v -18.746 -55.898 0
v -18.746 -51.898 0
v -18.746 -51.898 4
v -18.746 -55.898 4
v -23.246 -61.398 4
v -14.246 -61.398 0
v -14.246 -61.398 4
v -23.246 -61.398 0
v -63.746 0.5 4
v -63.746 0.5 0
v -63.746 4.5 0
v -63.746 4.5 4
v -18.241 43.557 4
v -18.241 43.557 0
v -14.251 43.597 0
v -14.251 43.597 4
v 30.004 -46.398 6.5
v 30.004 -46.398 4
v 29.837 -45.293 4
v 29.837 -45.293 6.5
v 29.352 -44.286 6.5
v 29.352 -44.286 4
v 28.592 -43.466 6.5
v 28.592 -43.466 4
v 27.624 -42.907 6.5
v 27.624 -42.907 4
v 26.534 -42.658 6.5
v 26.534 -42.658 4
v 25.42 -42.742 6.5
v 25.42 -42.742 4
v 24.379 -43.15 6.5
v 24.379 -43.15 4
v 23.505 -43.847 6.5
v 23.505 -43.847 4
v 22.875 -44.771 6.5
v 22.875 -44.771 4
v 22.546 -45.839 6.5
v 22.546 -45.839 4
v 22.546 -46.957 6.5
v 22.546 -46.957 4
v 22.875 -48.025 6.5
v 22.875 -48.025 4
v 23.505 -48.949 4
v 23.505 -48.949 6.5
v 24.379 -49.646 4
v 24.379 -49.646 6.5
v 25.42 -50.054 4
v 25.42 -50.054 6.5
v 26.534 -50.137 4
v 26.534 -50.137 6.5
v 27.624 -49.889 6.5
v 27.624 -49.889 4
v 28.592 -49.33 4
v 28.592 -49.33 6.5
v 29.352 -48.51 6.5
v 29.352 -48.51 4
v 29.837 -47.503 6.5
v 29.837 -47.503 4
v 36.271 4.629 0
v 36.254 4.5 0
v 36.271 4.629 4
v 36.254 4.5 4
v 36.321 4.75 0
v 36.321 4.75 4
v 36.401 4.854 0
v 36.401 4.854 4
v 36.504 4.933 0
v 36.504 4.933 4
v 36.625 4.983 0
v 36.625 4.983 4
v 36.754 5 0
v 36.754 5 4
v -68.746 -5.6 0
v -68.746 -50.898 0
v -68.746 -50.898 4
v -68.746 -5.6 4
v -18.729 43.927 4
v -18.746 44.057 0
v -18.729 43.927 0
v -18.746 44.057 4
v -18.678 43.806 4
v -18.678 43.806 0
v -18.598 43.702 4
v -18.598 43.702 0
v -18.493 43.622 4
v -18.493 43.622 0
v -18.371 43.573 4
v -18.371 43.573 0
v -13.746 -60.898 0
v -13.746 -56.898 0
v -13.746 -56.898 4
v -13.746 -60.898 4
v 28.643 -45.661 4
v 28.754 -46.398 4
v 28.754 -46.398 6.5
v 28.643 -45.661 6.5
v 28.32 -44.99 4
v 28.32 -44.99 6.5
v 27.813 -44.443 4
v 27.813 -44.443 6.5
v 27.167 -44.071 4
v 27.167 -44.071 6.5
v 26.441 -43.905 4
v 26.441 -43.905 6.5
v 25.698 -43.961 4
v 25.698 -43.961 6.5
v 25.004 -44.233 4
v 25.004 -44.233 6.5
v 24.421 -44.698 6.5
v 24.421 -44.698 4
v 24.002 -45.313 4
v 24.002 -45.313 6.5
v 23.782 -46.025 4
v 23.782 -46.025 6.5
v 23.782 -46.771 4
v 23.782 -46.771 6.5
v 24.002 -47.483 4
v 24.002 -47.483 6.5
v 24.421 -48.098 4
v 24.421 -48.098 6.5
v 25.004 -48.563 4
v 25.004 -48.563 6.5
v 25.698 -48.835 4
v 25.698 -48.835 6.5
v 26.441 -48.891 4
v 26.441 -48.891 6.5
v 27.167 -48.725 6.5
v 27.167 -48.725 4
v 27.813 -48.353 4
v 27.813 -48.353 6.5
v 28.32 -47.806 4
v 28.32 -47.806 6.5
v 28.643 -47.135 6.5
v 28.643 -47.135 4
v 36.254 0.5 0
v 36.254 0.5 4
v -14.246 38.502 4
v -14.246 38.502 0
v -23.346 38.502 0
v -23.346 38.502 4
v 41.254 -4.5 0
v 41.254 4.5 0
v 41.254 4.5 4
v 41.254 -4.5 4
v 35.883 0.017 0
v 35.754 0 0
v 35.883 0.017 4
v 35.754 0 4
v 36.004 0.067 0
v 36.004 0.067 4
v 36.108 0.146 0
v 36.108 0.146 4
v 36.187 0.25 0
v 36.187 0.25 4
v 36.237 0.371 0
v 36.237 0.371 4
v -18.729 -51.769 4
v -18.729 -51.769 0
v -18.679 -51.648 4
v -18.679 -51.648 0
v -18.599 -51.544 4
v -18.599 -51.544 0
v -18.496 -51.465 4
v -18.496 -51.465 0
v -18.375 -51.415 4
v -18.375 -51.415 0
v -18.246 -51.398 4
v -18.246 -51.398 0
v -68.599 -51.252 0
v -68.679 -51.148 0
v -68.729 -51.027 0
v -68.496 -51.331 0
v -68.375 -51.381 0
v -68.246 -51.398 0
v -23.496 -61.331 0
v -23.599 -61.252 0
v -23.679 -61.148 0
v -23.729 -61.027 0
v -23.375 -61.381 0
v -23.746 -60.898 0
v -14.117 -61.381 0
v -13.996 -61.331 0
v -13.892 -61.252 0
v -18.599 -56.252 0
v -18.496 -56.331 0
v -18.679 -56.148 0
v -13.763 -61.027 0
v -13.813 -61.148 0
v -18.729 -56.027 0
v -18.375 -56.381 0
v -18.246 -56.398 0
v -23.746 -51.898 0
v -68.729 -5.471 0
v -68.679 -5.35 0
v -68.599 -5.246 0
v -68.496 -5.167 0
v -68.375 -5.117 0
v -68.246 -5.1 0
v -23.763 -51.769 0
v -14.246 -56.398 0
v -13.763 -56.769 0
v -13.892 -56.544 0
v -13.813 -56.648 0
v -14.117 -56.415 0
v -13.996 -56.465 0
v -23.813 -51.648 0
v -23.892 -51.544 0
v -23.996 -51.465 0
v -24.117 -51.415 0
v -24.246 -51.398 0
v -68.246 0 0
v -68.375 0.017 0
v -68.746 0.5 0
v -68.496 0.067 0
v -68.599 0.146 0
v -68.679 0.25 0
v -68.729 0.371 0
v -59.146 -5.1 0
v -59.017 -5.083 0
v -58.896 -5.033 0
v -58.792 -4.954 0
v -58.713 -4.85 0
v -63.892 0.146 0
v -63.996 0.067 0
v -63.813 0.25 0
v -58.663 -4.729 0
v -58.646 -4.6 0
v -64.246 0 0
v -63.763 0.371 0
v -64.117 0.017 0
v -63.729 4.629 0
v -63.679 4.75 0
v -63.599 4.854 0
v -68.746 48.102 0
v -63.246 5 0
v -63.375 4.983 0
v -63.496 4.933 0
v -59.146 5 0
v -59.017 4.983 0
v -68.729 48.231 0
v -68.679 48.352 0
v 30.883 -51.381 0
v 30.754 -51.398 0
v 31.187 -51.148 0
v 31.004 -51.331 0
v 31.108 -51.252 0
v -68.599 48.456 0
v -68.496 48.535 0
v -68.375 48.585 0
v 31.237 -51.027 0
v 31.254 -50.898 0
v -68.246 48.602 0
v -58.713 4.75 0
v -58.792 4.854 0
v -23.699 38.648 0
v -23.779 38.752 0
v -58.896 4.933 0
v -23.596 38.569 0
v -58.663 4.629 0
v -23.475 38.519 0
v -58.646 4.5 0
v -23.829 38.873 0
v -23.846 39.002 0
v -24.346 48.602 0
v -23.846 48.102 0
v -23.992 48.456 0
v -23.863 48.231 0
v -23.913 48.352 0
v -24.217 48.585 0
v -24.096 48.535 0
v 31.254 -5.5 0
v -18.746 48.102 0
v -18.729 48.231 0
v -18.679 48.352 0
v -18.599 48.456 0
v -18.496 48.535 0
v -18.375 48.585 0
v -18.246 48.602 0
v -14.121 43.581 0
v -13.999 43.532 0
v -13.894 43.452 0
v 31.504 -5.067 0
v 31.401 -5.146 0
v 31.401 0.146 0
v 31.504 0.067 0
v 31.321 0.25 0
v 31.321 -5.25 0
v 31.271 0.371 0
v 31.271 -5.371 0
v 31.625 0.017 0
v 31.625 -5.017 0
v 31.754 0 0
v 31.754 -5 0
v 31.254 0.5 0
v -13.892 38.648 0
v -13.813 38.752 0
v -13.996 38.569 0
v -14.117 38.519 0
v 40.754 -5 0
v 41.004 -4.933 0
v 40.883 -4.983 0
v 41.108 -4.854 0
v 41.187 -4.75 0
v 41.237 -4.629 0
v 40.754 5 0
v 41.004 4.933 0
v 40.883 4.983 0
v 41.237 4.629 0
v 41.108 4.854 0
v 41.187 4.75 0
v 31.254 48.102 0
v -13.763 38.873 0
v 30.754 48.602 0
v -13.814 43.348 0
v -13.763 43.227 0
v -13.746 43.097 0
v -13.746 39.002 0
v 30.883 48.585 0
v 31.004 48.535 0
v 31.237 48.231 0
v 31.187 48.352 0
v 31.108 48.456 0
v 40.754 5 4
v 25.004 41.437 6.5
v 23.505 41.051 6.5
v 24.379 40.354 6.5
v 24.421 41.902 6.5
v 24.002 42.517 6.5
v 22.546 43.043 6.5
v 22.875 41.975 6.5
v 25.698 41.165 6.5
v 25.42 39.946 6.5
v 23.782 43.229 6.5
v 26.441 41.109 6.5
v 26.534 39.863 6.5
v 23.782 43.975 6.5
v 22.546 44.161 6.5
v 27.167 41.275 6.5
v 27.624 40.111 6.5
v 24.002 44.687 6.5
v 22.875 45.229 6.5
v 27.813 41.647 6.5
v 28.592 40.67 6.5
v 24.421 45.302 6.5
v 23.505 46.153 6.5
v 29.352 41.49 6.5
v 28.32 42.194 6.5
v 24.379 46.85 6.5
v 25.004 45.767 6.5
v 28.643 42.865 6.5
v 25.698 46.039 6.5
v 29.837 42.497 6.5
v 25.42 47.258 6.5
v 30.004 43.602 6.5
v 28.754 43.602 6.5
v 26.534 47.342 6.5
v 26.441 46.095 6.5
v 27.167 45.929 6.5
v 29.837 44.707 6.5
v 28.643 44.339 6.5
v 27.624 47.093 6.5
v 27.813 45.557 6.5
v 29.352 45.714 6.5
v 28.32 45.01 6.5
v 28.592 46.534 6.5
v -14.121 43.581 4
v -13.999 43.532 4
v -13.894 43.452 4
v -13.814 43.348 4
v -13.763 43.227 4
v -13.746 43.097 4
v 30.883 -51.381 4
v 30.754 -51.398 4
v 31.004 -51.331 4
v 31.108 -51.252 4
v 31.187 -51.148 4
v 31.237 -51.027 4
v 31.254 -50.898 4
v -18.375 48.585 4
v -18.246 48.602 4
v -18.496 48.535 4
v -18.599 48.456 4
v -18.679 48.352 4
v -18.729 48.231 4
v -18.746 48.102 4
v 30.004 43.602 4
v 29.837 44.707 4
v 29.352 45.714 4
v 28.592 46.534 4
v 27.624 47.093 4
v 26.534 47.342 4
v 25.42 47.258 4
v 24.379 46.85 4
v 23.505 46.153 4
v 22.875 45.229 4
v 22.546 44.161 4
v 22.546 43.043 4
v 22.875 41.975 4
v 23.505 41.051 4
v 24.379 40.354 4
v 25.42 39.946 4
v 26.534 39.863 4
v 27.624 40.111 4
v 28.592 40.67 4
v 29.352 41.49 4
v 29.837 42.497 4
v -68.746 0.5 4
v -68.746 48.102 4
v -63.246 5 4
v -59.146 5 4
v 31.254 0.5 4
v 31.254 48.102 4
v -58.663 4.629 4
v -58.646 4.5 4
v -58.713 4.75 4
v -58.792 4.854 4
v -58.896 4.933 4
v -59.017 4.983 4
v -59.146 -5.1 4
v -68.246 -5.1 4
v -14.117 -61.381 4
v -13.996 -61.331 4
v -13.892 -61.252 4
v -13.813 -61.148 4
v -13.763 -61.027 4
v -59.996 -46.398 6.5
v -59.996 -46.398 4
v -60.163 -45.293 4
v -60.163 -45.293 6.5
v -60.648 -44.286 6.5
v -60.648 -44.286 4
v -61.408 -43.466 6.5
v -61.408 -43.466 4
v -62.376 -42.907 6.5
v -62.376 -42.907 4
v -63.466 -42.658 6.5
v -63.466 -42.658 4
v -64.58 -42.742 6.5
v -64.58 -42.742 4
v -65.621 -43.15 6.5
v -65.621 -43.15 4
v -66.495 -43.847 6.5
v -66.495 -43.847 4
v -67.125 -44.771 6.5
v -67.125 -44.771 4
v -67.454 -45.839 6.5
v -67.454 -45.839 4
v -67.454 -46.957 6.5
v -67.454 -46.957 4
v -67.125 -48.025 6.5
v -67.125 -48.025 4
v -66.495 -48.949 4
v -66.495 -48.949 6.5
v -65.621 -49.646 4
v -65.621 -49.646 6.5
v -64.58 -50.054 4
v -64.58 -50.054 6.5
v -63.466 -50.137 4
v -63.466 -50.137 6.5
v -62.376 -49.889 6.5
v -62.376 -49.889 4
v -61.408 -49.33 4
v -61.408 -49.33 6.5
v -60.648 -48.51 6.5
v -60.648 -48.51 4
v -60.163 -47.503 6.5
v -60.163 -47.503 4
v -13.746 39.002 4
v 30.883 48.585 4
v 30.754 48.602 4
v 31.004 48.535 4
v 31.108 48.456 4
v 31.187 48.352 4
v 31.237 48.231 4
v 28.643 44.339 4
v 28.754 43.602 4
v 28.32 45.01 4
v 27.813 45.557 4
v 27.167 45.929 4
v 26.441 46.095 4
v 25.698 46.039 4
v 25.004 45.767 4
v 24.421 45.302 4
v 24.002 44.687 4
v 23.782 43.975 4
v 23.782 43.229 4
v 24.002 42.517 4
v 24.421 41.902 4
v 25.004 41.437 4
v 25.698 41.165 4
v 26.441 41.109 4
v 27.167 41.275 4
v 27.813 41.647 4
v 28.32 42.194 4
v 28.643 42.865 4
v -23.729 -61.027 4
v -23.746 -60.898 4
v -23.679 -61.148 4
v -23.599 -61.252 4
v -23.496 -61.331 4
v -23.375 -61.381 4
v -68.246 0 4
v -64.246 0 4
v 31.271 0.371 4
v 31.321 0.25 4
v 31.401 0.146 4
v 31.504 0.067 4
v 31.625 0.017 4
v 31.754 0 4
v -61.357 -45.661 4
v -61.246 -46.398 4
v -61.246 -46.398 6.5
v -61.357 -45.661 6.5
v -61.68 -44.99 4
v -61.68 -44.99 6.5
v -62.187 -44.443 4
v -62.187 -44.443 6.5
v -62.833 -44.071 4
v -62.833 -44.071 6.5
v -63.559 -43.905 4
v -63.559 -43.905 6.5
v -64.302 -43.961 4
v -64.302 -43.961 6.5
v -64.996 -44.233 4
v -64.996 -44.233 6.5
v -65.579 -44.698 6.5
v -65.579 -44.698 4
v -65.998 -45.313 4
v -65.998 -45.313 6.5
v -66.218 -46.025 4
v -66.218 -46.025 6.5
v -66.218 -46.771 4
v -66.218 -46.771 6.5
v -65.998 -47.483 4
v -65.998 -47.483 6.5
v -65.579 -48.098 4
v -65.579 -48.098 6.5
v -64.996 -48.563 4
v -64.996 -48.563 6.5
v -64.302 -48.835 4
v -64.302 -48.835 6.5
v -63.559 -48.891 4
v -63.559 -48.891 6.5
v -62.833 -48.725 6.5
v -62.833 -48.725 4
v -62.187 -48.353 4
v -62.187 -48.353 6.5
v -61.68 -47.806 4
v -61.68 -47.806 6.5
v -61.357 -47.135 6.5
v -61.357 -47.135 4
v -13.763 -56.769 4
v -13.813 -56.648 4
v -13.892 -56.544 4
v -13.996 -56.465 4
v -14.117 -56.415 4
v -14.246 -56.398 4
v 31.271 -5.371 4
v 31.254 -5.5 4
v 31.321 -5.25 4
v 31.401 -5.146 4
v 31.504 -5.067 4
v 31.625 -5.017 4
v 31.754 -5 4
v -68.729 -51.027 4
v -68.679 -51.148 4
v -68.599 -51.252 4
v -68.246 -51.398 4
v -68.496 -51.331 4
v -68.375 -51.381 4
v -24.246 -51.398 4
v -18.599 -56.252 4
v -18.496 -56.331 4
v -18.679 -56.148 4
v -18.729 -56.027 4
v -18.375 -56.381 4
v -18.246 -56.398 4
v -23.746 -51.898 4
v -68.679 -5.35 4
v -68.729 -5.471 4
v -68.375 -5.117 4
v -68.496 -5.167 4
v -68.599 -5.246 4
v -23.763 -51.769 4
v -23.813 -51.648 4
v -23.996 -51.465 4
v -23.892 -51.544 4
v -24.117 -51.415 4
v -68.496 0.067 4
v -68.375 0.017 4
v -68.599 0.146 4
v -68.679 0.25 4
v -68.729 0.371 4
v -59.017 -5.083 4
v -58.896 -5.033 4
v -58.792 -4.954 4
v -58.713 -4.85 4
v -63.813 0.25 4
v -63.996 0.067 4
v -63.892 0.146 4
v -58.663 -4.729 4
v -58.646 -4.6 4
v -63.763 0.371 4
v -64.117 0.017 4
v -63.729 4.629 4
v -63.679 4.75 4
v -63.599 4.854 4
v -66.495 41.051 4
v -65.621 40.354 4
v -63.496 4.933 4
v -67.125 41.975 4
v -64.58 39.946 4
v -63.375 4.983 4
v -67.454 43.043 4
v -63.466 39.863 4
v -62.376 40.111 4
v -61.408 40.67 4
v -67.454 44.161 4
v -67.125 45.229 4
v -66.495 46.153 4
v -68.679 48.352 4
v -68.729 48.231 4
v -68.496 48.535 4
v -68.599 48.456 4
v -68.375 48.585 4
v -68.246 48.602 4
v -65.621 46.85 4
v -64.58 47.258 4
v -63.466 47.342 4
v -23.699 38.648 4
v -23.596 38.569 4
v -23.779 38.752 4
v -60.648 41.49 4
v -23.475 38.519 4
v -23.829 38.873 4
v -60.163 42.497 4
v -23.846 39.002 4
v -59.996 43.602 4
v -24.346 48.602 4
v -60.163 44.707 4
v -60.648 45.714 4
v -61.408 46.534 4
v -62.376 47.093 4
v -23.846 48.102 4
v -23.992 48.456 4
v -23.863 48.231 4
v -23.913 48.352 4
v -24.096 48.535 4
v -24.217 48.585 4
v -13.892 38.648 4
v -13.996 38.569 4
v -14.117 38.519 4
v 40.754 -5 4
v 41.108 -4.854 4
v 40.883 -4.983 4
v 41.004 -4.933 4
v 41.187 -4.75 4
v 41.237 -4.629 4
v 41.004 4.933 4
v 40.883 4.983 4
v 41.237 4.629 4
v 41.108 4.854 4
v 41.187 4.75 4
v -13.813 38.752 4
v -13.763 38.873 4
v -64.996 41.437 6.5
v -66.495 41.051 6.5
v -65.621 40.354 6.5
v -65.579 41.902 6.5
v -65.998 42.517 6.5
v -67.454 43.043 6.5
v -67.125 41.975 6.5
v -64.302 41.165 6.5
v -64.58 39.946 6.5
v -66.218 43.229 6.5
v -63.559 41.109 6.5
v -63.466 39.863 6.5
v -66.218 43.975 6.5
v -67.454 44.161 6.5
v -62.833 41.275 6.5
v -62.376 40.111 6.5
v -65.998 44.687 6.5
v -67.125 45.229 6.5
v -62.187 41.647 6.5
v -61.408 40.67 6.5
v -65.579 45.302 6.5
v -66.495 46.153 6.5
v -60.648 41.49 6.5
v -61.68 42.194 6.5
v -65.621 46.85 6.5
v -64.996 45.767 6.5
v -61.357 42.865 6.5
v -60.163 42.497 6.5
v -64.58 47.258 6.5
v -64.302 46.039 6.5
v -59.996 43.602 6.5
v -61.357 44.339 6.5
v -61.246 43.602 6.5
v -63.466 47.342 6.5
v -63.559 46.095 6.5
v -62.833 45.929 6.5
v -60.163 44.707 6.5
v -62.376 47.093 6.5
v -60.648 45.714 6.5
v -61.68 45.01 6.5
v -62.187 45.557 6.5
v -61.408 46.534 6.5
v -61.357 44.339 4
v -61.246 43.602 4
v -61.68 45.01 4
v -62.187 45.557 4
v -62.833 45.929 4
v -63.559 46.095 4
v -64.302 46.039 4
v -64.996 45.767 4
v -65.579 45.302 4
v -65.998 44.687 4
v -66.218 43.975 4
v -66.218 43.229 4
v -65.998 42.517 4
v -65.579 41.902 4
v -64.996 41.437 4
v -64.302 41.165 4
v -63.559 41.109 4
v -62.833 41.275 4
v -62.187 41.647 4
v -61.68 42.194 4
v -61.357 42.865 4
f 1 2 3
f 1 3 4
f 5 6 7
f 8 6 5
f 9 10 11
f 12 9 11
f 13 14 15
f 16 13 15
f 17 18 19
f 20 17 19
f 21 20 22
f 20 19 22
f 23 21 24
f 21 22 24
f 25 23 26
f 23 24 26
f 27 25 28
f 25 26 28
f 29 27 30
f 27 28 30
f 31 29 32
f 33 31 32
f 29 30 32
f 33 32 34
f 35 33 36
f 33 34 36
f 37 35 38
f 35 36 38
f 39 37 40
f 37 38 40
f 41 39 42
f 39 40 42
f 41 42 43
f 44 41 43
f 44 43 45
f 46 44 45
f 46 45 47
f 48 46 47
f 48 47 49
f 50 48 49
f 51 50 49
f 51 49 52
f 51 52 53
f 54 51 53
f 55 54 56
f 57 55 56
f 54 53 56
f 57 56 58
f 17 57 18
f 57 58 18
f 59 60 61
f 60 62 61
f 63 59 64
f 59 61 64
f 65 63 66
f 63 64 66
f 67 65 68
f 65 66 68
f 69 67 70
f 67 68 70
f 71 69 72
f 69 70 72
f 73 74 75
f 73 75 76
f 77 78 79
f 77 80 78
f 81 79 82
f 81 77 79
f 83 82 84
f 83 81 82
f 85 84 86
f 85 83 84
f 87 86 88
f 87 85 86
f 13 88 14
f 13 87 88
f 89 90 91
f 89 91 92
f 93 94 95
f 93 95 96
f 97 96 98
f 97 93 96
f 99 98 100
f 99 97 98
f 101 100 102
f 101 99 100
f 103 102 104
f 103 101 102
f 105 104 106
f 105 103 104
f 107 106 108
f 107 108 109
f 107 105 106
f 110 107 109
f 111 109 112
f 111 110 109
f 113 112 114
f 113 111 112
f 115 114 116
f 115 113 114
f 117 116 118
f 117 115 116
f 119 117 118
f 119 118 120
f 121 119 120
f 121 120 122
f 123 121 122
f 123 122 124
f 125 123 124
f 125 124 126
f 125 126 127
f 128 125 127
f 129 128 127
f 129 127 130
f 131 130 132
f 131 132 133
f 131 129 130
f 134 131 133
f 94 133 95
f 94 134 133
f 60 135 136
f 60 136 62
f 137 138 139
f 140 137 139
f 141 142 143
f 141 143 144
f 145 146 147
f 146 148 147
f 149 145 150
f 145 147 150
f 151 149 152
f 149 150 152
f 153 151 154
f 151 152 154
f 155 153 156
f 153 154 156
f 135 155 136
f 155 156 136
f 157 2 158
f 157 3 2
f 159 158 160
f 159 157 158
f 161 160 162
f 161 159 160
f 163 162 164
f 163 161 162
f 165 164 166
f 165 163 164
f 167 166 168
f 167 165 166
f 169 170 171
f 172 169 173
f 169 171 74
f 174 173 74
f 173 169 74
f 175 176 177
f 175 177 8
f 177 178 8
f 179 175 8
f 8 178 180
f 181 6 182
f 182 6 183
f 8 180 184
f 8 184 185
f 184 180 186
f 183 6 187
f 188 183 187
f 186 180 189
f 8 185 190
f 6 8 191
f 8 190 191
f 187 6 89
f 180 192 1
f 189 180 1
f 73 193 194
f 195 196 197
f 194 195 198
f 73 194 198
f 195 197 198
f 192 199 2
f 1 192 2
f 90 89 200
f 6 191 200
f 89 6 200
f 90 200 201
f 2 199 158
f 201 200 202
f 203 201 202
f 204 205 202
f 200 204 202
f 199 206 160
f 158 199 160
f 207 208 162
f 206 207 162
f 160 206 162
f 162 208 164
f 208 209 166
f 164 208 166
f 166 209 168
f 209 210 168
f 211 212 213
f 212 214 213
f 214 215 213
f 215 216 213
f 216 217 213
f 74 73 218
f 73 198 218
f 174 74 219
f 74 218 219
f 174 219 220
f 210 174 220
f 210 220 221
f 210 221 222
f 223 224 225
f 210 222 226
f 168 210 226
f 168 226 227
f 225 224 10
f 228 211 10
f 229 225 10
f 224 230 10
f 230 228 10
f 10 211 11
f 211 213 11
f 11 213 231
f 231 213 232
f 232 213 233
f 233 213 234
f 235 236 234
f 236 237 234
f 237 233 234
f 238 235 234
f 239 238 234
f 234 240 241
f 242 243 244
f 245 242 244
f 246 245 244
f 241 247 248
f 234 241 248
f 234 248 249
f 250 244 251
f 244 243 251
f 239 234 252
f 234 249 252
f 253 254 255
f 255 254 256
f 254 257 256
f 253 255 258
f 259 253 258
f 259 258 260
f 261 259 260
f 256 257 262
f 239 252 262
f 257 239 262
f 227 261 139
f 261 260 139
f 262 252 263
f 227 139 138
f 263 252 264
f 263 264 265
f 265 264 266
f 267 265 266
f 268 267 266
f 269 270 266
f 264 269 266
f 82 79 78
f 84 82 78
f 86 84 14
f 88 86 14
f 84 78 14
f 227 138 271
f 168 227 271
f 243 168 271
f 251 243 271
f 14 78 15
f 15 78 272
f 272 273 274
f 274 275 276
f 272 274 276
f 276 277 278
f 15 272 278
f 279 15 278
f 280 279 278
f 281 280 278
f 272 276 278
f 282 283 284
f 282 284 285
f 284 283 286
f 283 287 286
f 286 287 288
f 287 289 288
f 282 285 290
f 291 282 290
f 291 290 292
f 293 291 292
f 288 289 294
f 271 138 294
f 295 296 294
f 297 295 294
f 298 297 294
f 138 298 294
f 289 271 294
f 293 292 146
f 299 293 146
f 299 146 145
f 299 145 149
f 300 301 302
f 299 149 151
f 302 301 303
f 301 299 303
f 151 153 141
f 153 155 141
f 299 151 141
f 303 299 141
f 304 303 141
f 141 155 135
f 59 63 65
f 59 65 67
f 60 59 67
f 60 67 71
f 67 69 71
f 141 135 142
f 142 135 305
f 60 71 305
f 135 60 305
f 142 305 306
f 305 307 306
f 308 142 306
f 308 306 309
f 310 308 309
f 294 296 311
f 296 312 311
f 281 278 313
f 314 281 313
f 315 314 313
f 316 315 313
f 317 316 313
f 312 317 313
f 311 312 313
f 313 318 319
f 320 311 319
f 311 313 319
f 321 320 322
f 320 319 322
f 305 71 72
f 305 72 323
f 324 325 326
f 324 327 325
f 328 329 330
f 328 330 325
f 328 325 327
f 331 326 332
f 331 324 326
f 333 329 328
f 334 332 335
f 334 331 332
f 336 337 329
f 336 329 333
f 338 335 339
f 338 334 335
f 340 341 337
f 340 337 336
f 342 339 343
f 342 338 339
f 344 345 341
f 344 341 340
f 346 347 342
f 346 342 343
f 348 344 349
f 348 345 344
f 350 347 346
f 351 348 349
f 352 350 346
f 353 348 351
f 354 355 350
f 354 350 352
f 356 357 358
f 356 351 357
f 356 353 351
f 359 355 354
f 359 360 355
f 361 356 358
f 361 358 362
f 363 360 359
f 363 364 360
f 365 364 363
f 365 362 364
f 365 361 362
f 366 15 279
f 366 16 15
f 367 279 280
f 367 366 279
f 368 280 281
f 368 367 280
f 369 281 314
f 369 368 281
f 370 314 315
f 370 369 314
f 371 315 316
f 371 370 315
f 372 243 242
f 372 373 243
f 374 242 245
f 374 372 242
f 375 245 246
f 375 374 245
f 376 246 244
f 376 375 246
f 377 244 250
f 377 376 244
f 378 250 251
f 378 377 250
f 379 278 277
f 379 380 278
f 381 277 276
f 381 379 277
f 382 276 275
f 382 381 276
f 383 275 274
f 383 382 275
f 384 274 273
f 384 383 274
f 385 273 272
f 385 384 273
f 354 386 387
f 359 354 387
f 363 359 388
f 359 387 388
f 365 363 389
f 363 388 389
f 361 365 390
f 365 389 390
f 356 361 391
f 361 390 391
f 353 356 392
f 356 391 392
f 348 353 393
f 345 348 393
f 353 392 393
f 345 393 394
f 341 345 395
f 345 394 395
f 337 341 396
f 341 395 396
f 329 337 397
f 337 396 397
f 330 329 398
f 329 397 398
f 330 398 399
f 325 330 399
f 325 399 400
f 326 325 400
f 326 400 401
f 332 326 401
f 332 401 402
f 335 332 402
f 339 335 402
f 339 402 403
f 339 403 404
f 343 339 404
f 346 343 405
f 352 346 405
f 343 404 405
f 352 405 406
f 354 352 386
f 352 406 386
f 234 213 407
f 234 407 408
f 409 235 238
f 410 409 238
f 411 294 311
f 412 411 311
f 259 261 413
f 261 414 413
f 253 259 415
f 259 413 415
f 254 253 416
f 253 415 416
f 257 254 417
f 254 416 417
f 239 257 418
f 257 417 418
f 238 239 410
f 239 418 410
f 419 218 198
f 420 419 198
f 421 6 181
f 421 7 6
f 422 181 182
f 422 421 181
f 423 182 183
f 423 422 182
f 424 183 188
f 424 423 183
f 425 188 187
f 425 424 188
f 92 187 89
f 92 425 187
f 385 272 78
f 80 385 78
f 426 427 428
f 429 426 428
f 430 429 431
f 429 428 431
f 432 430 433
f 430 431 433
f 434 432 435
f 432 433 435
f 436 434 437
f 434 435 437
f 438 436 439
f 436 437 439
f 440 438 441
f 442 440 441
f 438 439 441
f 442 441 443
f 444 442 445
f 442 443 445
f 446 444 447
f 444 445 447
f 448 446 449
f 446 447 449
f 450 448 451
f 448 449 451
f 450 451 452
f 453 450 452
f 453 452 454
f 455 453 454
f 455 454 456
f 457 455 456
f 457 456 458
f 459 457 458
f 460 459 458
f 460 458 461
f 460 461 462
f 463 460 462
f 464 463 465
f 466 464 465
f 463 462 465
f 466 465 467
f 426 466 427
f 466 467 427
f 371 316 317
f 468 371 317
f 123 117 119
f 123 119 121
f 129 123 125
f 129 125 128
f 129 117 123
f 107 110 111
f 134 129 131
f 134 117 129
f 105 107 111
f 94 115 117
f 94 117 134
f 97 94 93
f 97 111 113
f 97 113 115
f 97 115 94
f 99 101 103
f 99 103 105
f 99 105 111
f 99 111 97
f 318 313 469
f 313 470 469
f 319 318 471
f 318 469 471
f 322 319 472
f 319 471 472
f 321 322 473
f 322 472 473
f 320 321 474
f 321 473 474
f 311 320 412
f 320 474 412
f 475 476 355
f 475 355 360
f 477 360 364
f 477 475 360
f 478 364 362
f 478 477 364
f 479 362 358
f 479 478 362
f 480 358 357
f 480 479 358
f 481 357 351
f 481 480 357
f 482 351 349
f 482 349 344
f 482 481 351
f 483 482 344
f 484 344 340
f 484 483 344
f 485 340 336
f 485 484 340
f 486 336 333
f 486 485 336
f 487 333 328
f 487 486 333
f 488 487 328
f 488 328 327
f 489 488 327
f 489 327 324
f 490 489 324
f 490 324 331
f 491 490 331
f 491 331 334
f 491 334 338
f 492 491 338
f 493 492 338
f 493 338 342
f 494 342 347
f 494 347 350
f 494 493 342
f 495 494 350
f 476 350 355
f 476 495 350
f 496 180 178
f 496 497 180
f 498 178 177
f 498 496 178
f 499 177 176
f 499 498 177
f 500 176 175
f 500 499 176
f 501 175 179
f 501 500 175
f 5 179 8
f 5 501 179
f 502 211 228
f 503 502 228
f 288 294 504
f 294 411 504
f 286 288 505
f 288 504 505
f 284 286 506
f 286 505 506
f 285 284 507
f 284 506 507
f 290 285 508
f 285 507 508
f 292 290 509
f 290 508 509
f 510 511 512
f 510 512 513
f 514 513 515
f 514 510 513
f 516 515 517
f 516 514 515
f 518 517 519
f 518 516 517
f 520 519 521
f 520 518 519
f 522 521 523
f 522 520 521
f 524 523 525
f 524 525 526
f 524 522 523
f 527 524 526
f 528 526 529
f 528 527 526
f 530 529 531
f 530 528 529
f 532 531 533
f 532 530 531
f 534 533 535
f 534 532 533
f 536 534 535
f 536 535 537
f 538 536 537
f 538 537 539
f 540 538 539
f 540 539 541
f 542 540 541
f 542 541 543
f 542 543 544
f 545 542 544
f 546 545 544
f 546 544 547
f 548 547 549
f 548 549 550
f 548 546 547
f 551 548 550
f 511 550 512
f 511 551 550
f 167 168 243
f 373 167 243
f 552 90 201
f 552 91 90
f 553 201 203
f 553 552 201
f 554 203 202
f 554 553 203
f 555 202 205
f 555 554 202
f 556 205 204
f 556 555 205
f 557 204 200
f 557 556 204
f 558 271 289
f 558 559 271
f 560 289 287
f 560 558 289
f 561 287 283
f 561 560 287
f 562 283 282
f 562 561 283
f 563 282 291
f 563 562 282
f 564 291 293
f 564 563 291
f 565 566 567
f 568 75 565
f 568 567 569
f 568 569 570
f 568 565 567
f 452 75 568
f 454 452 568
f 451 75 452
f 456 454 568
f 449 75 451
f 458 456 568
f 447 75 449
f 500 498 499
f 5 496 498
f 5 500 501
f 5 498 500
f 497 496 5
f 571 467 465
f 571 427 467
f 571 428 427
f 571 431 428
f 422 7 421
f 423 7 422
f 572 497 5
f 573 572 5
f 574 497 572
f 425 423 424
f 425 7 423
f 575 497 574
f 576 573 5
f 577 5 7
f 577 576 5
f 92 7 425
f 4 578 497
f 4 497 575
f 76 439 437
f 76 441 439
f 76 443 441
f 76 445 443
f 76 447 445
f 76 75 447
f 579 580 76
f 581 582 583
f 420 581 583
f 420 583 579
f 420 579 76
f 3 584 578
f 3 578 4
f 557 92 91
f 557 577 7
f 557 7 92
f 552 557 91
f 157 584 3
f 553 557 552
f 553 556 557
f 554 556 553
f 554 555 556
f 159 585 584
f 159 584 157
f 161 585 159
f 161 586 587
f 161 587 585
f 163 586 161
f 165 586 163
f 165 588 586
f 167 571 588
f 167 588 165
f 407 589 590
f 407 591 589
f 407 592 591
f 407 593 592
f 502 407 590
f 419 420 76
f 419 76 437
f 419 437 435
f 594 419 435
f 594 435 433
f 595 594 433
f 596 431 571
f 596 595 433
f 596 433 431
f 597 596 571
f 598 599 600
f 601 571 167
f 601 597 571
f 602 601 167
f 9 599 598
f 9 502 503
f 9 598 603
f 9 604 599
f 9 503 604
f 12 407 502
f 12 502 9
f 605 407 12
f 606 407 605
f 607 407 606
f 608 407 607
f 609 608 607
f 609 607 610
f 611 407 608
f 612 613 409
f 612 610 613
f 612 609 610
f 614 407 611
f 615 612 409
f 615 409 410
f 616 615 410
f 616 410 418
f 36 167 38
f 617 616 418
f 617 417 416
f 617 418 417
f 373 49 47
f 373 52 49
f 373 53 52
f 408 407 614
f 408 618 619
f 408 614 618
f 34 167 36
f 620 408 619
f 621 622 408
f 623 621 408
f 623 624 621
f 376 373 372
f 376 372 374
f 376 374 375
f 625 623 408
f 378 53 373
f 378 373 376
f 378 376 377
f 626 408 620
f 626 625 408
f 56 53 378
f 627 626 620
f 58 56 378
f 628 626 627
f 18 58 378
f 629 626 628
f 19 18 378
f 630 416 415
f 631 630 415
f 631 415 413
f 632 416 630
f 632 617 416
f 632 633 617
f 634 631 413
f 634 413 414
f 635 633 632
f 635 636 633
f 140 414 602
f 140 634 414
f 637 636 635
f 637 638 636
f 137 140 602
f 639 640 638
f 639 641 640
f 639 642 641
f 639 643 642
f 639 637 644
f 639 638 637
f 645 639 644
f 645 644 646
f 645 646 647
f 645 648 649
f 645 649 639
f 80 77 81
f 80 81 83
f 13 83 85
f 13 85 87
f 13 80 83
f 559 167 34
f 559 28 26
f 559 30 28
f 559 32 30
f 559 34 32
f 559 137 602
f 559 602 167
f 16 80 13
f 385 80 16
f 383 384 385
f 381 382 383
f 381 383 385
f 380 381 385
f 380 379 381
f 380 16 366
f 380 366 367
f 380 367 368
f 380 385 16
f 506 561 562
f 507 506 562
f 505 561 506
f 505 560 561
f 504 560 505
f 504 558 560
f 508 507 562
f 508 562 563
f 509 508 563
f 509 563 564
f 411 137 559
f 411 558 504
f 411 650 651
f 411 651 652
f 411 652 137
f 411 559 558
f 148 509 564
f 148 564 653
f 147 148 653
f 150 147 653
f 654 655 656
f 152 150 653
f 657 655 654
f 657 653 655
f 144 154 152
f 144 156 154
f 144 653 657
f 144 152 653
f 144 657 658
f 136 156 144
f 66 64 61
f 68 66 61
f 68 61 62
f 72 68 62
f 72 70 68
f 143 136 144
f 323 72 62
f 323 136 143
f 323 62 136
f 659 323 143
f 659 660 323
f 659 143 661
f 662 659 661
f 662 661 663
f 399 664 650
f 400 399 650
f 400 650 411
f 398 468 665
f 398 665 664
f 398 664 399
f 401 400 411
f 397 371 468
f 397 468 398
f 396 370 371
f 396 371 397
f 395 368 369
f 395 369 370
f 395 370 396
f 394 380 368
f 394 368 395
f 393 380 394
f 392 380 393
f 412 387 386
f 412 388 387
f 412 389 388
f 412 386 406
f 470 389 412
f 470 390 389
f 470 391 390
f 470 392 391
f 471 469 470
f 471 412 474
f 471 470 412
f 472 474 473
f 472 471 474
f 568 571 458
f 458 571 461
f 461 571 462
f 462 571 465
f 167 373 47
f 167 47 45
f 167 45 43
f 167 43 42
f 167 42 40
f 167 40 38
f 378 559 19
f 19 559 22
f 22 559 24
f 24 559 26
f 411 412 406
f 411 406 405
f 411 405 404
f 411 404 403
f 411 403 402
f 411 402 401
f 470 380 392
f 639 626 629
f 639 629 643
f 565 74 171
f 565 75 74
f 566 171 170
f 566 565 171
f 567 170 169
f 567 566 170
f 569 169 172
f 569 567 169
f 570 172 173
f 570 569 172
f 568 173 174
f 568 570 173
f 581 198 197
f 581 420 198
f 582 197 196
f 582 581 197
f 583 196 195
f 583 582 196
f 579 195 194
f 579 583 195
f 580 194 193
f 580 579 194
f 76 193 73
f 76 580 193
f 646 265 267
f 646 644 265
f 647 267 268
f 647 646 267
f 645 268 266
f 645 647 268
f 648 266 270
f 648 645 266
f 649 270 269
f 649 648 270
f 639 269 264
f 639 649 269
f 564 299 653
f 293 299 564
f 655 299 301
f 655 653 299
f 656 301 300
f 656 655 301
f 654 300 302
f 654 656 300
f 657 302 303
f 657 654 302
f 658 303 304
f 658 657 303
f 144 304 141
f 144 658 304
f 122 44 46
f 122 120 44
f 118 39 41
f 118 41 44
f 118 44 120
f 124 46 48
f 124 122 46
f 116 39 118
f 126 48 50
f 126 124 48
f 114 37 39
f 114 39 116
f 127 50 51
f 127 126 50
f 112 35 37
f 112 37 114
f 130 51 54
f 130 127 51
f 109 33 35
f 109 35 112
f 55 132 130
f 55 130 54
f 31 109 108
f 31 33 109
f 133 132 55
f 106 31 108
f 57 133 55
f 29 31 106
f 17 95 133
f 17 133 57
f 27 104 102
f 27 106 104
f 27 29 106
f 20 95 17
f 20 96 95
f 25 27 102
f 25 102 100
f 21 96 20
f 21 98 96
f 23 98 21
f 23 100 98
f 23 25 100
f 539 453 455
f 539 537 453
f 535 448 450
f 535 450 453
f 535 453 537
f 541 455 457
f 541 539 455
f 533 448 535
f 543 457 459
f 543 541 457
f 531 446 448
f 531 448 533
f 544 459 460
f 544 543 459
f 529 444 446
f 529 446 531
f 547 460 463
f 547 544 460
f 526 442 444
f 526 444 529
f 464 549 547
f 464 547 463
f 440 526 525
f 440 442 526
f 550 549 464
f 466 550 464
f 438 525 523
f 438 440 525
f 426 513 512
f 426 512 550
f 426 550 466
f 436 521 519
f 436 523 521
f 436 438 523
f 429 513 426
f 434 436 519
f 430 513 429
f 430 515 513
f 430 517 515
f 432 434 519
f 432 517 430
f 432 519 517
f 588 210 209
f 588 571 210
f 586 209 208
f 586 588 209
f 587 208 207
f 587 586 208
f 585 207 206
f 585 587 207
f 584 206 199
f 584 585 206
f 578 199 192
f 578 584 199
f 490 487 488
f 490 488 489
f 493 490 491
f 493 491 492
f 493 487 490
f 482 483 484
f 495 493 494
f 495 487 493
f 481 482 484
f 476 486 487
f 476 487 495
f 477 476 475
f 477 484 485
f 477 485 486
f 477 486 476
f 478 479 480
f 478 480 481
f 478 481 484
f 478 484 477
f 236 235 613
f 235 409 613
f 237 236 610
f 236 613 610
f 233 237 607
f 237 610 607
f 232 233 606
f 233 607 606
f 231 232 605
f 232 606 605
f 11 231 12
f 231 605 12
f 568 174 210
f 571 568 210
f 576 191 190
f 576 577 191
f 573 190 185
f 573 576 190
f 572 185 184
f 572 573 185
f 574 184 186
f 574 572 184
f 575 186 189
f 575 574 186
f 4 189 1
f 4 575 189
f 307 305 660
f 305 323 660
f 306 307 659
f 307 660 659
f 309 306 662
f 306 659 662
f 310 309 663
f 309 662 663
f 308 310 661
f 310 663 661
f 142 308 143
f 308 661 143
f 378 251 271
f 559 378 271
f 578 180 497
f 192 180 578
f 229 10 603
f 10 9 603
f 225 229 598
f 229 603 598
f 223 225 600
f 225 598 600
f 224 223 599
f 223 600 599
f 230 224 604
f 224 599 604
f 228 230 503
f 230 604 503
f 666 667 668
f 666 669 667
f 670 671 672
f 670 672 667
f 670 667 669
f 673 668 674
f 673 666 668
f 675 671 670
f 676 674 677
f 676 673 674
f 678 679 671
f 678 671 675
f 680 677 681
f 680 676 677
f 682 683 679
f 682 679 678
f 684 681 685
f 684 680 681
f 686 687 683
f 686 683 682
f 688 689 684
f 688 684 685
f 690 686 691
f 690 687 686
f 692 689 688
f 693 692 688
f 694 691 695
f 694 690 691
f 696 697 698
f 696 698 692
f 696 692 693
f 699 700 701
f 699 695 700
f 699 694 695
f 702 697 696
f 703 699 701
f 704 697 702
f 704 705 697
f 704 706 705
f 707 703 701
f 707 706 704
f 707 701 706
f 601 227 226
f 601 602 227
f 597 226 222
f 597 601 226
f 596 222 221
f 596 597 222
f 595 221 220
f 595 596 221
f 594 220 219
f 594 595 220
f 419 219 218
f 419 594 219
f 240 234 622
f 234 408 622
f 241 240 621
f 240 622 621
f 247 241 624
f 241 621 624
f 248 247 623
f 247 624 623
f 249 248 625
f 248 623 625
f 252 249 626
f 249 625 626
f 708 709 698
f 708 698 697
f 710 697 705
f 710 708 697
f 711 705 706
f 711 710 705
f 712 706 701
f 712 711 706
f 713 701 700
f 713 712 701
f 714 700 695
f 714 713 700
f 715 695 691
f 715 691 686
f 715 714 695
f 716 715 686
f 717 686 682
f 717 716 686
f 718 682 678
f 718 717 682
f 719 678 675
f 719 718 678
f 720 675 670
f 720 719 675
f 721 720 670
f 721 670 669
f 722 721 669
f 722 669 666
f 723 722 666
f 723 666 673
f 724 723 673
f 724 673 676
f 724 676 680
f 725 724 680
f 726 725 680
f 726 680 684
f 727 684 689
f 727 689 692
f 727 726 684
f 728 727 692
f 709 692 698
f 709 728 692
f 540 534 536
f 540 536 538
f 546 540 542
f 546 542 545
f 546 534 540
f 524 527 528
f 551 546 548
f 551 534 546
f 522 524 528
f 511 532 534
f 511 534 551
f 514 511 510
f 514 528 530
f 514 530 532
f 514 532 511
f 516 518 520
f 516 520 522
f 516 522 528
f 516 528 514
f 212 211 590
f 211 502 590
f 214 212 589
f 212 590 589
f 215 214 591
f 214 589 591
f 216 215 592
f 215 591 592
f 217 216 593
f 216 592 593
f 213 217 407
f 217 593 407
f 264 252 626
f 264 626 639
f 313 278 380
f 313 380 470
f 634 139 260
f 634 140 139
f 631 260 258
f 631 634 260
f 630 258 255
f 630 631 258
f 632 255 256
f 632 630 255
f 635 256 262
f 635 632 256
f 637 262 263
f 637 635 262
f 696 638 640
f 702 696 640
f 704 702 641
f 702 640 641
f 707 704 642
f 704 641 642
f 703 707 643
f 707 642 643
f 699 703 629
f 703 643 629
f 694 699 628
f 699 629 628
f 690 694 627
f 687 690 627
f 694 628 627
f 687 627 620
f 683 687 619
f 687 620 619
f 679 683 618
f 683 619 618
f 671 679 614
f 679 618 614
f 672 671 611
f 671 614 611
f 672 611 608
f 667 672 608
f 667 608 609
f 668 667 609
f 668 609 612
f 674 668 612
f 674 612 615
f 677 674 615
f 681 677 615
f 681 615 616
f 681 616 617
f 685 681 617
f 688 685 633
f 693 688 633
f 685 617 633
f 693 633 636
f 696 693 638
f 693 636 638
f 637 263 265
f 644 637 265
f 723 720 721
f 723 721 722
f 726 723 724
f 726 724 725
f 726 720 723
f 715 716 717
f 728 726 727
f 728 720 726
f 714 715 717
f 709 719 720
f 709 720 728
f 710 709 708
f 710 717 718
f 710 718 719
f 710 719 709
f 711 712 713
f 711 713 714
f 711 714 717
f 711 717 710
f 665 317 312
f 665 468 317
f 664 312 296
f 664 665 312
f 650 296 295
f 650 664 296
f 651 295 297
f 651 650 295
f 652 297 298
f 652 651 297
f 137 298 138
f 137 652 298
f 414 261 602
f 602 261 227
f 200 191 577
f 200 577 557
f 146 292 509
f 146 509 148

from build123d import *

# Parameters (mm, degrees)
F0_W      = 100
F0_H      = 100
F1_DEPTH  = 4
F3_DEPTH  = 4
F5_DEPTH  = 25
F6_R      = 0.5
F8_R      = 0.5
F9_R      = 0.5
F10_R     = 0.5
F11_R     = 3.75
F11_R_2   = 2.5
F12_DEPTH = 2.5


with BuildPart() as f1:
    # F0 (on Top) → F1 (new body)
    with BuildSketch(Plane.XY):
        with Locations((-18.7459290028, -1.397985096)):
            Rectangle(F0_W, F0_H)
    extrude(amount=F1_DEPTH)

    # F4 (on face) → F5 (cut)
    with BuildSketch(Plane(origin=(0, 0, 0), x_dir=(1, 0, 0), z_dir=(0, 0, -1))):
        Polygon((-23.8459290028, -48.602014904), (-18.7459290028, -48.602014904), (-18.7459290028, -43.552014904), (-13.7459290028, -43.602014904), (-13.7459290028, -38.502014904), (-23.8459290028, -38.502014904), align=None)
        Polygon((-68.7459290028, 5.1), (-68.7459290028, 0), (-63.7459290028, 0), (-63.7459290028, -5), (-58.6459290028, -5), (-58.6459290028, 5.1), align=None)
    extrude(amount=-F5_DEPTH, mode=Mode.SUBTRACT)

    # F6
    f6_edges = [f1.edges().sort_by_distance(p)[0] for p in [
        (31.254071, -51.397985, 2),
        (31.254071, 48.602015, 2),
        (-68.745929, 48.602015, 2),
        (-68.745929, -51.397985, 2),
    ]]
    fillet(f6_edges, radius=F6_R)


with BuildPart() as f3:
    # F2 (on face) → F3 (new body)
    with BuildSketch(Plane(origin=(0, 0, 0), x_dir=(1, 0, 0), z_dir=(0, 0, -1))):
        Polygon((-23.7459290028, 51.397985096), (-18.7459290028, 51.397985096), (-18.7459290028, 56.397985096), (-13.7459290028, 56.397985096), (-13.7459290028, 61.397985096), (-23.7459290028, 61.397985096), align=None)
    extrude(amount=-F3_DEPTH)


with BuildPart() as f3b:
    # F2 (on face) → F3, piece 2 (new body)
    with BuildSketch(Plane(origin=(0, 0, 0), x_dir=(1, 0, 0), z_dir=(0, 0, -1))):
        Polygon((41.2540709972, 5), (31.2540709972, 5), (31.2540709972, 0), (36.2540709972, 0), (36.2540709972, -5), (41.2540709972, -5), align=None)
    extrude(amount=-F3_DEPTH)


with BuildPart() as f3_1:
    add(f3.part)

    # F7: union F1, F3b
    add(f1.part)
    add(f3b.part)

    # F8
    f8_edges = [f3_1.edges().sort_by_distance(p)[0] for p in [
        (-23.745929, -51.397985, 2),
        (-18.745929, -51.397985, 2),
        (-13.745929, -61.397985, 2),
        (-13.745929, -56.397985, 2),
        (-18.745929, -56.397985, 2),
        (-23.745929, -61.397985, 2),
        (31.254071, -5, 2),
        (41.254071, -5, 2),
        (41.254071, 5, 2),
        (36.254071, 5, 2),
        (36.254071, 0, 2),
        (31.254071, 0, 2),
        (-23.845929, 38.502015, 2),
        (-13.745929, 38.502015, 2),
        (-18.745929, 48.602015, 2),
        (-18.745929, 43.552015, 2),
        (-23.845929, 48.602015, 2),
        (-13.745929, 43.602015, 2),
    ]]
    fillet(f8_edges, radius=F8_R)

    # F9
    f9_edges = [f3_1.edges().sort_by_distance(p)[0] for p in [
        (-58.645929, 5, 2),
        (-68.745929, 0, 2),
    ]]
    fillet(f9_edges, radius=F9_R)

    # F10
    f10_edges = [f3_1.edges().sort_by_distance(p)[0] for p in [
        (-63.745929, 0, 2),
        (-63.745929, 5, 2),
        (-58.645929, -5.1, 2),
        (-68.745929, -5.1, 2),
    ]]
    fillet(f10_edges, radius=F10_R)

    # F11 (on face) → F12 (join)
    with BuildSketch(Plane.XY.offset(4)):
        with Locations((-63.7459290028, 43.602014904)):
            Circle(F11_R)
        with Locations((-63.7459290028, 43.602014904)):
            Circle(F11_R_2, mode=Mode.SUBTRACT)
        with Locations((26.2540709972, 43.602014904)):
            Circle(F11_R)
        with Locations((26.2540709972, 43.602014904)):
            Circle(F11_R_2, mode=Mode.SUBTRACT)
        with Locations((26.2540709972, -46.397985096)):
            Circle(F11_R)
        with Locations((26.2540709972, -46.397985096)):
            Circle(F11_R_2, mode=Mode.SUBTRACT)
        with Locations((-63.7459290028, -46.397985096)):
            Circle(F11_R)
        with Locations((-63.7459290028, -46.397985096)):
            Circle(F11_R_2, mode=Mode.SUBTRACT)
    extrude(amount=F12_DEPTH)


solid = f3_1.part
